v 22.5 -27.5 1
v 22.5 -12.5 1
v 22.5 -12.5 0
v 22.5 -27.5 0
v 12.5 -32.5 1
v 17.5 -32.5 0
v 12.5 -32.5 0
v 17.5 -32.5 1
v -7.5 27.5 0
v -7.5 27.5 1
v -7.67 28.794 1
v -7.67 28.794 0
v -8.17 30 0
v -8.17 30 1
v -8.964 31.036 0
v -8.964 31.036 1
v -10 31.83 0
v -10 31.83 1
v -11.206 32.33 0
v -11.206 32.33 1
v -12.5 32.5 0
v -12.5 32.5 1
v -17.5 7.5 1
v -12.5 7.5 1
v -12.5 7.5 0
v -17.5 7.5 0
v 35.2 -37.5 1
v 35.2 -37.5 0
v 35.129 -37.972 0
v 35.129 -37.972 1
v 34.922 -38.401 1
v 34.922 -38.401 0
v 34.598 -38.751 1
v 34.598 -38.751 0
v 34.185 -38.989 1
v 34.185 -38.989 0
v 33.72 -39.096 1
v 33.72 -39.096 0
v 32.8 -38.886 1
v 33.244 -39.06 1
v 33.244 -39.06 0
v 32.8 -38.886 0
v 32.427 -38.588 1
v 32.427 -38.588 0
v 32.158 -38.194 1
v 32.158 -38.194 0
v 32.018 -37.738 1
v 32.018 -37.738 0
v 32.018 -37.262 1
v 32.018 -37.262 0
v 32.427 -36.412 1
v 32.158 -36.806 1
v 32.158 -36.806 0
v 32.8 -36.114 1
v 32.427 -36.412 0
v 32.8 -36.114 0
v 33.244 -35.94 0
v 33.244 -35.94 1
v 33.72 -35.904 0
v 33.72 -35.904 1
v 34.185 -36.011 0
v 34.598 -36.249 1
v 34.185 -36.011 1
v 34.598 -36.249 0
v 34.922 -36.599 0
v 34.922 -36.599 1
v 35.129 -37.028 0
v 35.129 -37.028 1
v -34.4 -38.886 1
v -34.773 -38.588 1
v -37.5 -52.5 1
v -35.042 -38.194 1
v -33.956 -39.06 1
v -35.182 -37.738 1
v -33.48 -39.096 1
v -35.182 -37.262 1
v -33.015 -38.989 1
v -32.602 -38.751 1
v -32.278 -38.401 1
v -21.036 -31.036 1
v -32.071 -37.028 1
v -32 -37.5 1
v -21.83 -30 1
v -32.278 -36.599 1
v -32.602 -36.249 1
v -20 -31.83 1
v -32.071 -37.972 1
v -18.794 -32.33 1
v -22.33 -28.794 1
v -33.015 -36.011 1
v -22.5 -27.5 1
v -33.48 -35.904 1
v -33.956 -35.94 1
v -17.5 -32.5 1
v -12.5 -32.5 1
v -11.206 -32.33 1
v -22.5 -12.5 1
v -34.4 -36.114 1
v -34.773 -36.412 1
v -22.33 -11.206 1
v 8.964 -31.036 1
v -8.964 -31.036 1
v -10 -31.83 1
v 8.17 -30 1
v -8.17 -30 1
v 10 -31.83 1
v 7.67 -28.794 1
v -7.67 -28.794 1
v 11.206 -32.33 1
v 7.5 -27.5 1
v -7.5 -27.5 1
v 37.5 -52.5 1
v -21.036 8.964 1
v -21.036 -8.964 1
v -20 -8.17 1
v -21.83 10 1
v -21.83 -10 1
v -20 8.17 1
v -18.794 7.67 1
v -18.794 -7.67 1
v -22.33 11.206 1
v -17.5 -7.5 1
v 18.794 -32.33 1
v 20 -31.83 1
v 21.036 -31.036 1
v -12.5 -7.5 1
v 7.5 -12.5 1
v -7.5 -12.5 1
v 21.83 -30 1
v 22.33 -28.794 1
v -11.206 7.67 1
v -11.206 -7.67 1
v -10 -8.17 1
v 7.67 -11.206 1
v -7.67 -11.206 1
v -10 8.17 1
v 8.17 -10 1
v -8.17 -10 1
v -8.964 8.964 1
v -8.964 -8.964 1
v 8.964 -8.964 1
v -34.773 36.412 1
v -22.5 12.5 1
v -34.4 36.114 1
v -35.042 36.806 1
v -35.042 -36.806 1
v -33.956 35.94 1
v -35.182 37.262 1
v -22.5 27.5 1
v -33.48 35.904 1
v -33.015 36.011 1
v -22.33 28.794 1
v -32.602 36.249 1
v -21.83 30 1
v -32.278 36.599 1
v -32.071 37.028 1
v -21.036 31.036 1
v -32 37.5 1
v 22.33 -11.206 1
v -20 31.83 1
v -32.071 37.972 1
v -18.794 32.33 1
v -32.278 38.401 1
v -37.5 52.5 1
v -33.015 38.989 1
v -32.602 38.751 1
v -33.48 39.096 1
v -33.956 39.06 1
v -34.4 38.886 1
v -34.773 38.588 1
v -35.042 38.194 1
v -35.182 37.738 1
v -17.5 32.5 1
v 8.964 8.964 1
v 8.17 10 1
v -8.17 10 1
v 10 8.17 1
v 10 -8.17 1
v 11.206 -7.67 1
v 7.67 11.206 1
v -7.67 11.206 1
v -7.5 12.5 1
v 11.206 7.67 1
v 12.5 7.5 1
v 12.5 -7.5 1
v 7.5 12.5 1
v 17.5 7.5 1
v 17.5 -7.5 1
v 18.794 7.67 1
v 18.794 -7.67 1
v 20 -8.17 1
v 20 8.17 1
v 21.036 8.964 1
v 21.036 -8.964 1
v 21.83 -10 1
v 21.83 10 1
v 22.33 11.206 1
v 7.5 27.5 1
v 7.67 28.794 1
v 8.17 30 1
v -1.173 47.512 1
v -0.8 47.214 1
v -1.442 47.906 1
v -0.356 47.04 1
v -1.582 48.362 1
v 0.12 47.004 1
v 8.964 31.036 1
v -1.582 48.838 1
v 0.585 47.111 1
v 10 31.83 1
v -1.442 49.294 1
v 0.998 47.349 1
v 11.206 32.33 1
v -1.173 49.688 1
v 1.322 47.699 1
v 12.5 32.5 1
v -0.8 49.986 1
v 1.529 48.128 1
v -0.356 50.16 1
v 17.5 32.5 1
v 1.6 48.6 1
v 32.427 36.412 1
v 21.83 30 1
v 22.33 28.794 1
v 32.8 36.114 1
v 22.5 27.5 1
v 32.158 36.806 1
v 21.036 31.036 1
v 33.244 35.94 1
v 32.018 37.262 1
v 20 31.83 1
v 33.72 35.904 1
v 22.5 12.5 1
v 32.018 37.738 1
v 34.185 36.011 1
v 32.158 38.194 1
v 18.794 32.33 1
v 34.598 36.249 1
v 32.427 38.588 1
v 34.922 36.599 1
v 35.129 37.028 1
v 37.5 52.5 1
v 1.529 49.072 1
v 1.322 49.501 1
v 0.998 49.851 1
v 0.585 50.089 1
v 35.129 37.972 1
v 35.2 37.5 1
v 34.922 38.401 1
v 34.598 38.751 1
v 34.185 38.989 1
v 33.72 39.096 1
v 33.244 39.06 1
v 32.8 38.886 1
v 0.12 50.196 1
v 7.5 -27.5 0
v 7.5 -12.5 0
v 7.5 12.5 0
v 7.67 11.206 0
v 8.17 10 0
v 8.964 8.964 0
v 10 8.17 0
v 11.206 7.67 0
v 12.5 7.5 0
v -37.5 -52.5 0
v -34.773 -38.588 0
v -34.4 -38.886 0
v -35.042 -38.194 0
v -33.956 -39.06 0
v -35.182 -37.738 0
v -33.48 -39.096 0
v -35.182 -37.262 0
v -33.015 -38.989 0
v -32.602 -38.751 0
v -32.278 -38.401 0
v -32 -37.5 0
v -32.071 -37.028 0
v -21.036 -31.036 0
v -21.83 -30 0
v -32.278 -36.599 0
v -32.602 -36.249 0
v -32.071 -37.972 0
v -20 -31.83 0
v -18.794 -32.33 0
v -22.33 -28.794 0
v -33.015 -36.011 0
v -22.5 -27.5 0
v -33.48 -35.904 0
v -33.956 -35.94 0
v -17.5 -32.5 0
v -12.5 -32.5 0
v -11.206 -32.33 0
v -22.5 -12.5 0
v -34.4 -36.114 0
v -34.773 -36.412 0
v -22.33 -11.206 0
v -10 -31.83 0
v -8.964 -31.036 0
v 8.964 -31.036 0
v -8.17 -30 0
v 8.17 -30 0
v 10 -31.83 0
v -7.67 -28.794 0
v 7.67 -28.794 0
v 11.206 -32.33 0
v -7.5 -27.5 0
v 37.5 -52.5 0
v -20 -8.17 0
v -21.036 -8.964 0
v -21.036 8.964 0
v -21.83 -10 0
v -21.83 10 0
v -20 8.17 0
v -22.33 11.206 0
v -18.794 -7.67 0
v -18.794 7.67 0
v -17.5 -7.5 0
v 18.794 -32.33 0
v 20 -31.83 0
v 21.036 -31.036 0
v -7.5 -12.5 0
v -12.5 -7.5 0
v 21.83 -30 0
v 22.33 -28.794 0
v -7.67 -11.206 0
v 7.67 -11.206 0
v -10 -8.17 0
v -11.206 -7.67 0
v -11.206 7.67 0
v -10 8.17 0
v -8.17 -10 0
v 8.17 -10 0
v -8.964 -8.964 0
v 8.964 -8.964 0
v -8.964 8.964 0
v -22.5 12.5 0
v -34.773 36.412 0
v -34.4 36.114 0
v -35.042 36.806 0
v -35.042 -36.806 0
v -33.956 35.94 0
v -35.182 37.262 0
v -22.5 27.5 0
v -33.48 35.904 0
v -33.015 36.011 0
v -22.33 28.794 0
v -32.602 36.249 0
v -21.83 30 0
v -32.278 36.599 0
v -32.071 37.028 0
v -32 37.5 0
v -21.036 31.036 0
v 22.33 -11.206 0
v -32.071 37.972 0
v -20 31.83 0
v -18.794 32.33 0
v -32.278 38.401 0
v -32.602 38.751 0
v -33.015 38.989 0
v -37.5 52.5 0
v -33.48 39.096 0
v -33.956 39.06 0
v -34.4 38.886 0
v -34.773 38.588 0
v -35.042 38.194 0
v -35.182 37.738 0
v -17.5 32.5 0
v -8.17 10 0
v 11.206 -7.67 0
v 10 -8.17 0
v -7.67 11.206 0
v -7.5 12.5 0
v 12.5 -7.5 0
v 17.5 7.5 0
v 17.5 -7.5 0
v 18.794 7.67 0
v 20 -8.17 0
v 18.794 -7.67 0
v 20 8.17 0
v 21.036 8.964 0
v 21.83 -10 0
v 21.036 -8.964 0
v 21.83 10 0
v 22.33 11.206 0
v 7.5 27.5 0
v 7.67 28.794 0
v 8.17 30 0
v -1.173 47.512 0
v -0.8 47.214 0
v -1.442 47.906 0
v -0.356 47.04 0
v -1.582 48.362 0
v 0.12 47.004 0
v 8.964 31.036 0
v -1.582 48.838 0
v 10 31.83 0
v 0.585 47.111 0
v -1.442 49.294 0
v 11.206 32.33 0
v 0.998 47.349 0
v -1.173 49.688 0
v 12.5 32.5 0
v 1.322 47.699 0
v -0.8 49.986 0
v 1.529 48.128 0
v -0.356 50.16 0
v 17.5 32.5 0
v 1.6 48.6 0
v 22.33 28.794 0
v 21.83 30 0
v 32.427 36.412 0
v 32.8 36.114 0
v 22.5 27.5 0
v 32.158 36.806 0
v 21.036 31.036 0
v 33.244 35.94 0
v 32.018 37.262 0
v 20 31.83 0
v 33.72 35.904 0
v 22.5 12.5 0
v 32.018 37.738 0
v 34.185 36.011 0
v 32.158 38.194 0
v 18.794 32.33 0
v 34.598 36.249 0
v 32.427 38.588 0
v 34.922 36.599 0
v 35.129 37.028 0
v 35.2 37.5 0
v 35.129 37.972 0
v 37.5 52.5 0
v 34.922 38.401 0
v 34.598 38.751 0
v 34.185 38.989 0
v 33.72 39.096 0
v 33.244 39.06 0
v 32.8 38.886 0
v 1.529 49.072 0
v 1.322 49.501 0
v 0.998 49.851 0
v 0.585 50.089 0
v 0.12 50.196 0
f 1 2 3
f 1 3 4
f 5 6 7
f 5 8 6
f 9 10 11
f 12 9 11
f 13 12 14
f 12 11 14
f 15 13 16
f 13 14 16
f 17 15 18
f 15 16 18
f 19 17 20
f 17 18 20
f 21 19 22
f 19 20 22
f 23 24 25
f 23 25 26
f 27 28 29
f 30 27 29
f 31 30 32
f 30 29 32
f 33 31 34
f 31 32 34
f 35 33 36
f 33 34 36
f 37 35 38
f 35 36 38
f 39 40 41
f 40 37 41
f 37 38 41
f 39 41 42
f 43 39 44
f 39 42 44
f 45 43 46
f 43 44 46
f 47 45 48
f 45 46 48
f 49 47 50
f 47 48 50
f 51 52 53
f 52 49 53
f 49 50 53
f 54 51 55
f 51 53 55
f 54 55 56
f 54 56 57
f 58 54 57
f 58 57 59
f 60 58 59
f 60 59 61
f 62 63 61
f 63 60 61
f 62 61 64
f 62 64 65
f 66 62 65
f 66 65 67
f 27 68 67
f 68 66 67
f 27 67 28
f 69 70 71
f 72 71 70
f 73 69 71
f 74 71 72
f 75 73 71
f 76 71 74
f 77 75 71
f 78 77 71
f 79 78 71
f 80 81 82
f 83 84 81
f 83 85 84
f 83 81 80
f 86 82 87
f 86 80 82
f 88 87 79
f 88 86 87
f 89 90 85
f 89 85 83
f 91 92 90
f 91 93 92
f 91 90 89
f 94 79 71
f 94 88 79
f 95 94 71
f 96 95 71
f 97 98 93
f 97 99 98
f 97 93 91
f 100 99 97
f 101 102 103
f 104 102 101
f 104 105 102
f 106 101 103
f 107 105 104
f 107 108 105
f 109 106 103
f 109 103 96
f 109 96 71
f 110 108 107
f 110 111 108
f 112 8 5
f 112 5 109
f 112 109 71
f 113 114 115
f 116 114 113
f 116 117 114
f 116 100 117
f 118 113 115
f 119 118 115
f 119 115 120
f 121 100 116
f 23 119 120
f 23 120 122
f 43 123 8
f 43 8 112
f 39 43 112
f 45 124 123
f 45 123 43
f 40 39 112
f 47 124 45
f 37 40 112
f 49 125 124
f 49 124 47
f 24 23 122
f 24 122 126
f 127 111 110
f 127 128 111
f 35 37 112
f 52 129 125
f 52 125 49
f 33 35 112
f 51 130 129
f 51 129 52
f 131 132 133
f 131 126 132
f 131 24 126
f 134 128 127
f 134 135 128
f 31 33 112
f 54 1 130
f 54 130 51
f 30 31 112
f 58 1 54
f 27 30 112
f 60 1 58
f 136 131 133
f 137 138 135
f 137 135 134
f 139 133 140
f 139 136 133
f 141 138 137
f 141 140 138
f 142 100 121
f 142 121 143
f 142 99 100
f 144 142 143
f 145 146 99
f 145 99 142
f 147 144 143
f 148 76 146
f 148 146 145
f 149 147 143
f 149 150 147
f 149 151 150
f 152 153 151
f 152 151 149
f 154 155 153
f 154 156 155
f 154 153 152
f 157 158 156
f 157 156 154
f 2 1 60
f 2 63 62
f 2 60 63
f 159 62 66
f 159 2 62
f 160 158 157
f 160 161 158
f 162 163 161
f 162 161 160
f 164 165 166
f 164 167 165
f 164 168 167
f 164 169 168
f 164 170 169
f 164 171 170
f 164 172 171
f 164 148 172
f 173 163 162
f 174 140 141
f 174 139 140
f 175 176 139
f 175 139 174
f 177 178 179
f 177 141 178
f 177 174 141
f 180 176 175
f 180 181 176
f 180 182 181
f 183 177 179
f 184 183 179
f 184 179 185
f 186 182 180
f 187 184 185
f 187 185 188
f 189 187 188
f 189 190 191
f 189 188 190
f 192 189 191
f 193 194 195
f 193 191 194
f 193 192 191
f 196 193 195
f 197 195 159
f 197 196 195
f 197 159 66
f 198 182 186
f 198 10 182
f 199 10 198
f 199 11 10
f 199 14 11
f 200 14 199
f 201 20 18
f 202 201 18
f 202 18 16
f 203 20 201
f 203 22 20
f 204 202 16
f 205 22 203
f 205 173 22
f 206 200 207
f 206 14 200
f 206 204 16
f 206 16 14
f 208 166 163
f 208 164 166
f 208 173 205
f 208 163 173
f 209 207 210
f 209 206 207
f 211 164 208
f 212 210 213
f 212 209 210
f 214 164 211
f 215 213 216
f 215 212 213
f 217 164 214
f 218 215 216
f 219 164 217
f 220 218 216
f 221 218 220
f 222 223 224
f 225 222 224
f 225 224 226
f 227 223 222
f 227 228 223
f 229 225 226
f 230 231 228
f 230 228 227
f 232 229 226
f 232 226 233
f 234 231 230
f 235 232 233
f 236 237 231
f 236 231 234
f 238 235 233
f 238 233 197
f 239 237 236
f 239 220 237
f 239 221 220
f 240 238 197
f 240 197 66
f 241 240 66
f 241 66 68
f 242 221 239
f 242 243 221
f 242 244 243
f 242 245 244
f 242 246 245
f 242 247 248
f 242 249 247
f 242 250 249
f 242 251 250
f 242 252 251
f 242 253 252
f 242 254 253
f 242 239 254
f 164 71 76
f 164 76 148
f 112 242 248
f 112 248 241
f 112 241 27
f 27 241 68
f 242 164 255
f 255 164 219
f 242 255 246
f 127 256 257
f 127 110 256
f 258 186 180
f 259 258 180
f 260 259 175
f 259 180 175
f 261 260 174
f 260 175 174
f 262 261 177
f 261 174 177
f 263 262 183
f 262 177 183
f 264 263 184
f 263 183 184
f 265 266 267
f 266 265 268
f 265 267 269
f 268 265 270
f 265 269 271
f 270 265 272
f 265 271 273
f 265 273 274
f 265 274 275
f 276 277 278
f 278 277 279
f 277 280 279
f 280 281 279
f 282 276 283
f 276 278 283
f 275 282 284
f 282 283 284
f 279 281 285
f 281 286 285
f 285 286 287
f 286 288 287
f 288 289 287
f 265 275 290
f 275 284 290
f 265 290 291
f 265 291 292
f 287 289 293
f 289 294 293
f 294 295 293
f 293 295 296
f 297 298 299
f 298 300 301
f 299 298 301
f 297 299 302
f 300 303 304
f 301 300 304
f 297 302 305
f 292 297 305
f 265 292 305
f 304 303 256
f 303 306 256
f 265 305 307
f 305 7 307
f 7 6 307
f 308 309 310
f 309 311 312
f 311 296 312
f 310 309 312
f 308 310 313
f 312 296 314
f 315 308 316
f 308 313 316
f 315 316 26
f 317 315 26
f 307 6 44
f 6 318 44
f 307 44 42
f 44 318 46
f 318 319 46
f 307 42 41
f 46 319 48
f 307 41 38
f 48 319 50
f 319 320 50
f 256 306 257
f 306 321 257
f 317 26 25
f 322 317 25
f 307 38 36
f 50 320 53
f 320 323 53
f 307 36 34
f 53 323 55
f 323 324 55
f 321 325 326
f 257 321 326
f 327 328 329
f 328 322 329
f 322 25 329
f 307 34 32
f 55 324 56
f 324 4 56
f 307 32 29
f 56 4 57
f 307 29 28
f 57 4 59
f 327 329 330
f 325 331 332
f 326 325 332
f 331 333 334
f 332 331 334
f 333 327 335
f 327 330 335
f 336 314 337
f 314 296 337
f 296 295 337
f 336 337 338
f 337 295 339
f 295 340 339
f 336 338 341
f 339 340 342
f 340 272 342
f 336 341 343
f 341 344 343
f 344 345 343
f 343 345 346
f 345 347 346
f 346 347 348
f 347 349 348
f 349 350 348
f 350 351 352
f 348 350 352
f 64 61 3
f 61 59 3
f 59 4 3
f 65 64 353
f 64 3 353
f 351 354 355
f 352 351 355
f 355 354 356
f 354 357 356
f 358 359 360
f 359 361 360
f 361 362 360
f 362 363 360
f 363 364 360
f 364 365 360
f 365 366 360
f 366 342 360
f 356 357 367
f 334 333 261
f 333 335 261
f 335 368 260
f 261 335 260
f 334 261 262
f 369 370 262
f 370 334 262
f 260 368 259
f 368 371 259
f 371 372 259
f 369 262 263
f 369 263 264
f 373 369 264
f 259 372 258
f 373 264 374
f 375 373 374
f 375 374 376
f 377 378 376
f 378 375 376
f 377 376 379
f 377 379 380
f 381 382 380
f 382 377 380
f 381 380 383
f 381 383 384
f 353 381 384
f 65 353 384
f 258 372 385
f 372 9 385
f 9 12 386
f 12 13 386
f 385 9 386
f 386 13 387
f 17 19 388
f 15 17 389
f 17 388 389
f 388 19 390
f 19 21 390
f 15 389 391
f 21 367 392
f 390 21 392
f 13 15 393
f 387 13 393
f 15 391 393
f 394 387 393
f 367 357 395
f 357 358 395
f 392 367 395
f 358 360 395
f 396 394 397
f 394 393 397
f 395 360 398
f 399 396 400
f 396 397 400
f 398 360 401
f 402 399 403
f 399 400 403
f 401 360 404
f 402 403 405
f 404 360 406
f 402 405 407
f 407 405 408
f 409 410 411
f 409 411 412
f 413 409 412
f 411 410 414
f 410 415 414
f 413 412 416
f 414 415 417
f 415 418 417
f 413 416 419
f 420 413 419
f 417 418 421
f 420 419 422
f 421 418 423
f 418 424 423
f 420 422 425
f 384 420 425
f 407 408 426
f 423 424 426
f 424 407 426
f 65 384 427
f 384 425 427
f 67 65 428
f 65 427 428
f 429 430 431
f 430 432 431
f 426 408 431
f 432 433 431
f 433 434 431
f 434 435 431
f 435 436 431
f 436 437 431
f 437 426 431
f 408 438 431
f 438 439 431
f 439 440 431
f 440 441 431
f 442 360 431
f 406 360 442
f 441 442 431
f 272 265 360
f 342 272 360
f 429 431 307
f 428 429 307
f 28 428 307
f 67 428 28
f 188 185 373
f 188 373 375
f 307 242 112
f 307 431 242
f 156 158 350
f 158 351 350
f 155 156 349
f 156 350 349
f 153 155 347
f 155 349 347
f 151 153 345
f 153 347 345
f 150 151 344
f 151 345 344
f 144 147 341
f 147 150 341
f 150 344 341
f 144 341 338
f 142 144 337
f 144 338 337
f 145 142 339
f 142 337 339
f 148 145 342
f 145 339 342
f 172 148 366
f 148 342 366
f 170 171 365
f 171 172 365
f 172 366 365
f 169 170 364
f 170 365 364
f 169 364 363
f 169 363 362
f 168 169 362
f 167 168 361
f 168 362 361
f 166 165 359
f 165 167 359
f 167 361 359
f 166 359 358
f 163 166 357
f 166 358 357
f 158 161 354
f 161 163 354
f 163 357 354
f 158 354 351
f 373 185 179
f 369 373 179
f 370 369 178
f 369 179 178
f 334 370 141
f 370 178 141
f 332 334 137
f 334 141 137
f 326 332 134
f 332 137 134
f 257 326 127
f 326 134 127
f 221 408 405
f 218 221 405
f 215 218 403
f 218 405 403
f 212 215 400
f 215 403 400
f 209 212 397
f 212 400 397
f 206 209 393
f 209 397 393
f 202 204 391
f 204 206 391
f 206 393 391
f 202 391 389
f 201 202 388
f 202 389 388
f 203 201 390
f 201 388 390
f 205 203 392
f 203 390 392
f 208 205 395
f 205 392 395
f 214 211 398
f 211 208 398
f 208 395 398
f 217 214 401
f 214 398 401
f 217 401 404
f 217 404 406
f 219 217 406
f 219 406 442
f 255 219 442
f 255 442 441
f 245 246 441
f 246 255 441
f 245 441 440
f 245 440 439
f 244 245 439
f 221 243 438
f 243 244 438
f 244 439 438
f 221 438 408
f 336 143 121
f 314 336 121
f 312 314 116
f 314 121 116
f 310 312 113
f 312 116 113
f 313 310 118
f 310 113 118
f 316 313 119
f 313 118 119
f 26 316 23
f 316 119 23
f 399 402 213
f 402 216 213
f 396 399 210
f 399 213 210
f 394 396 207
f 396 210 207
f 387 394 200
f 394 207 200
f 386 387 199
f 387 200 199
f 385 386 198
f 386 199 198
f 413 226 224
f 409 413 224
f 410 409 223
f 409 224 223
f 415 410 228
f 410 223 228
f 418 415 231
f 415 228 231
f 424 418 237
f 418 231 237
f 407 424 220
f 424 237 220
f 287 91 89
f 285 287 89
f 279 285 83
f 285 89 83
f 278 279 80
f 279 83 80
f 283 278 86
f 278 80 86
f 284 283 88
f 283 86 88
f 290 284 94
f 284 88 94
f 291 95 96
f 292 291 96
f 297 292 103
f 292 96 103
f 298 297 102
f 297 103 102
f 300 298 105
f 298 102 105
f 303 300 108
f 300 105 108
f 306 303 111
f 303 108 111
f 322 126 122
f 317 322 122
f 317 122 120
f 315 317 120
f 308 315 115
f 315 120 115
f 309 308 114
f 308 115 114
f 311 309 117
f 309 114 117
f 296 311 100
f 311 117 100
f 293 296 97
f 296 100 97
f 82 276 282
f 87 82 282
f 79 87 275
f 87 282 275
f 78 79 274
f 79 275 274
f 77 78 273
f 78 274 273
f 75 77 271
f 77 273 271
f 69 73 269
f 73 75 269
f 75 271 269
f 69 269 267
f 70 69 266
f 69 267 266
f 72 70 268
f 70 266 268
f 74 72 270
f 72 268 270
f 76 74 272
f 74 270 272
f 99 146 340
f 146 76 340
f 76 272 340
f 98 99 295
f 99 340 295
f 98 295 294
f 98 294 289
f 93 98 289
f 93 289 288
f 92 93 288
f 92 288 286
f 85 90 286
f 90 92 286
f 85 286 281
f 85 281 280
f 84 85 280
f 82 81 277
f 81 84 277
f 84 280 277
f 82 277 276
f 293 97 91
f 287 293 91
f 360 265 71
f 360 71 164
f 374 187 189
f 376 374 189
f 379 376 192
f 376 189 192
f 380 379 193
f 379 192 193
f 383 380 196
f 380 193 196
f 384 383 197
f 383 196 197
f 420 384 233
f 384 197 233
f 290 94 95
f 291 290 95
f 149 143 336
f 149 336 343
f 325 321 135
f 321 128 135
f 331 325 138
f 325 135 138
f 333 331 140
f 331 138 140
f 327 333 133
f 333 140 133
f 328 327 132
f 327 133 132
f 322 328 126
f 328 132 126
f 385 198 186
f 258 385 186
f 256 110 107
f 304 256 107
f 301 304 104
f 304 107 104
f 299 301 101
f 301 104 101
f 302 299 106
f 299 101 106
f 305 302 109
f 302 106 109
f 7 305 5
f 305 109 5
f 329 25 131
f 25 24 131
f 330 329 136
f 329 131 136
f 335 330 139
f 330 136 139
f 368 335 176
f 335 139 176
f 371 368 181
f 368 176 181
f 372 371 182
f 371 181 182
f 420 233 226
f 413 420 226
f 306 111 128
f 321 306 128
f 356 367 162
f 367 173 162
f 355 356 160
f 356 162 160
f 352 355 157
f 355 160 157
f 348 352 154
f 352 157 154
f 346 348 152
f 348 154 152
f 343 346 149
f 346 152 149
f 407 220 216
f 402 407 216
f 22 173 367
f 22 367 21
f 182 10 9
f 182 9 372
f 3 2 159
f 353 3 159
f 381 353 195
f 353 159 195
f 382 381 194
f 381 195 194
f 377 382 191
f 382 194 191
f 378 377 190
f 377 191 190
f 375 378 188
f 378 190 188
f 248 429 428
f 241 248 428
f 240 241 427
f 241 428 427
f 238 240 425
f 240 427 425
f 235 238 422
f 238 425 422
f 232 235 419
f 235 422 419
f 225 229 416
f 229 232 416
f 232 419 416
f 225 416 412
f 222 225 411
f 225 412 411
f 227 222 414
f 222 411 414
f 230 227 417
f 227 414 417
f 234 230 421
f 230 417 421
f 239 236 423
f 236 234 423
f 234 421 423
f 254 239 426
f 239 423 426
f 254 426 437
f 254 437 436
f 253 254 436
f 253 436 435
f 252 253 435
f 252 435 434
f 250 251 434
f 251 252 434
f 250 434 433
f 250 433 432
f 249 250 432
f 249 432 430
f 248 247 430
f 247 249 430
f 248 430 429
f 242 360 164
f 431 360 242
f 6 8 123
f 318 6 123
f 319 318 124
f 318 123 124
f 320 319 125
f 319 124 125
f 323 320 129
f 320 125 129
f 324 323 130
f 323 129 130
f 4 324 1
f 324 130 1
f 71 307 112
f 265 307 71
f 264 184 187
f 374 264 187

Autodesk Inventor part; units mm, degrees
ref_plane "YZ Plane" through (0, 0, 0) normal (1, 0, 0) x (0, 1, 0)
ref_plane "XZ Plane" through (0, 0, 0) normal (0, 1, 0) x (-1, 0, 0)
ref_plane "XY Plane" through (0, 0, 0) normal (0, 0, 1) x (1, 0, 0)
sketch "Sketch1" plane through (0, 0, 0) normal (0, 0, 1) x (1, 0, 0)
  line L0 (-37.5, 52.5) -> (37.5, 52.5)
  line L1 (37.5, 52.5) -> (37.5, -52.5)
  line L2 (37.5, -52.5) -> (-37.5, -52.5)
  line L3 (-37.5, -52.5) -> (-37.5, 52.5)
  line L4 (-37.5, 52.5) -> (37.5, -52.5) construction
  line L5 (37.5, 52.5) -> (-37.5, -52.5) construction
  circle A0 centre (33.6, -37.5) radius 1.6
  line L6 (0, 0) -> (12.8976, 0)
  line L7 (0, 0) -> (0, 11.3109)
  circle A1 centre (-33.6, -37.5) radius 1.6
  circle A2 centre (33.6, 37.5) radius 1.6
  circle A3 centre (-33.6, 37.5) radius 1.6
  circle A4 centre (0, 48.6) radius 1.6
  dimension "d0" = 75
  dimension "d1" = 105
  dimension "d2" = 3.2
  dimension "d3" = 3.9
  dimension "d4" = 15
  dimension "d11" = 3.2
  dimension "d12" = 3.9
extrude "Plate1" add sketch "Sketch1" along normal blind 1
sketch "Sketch2" plane through (0, 0, 1) normal (0, 0, 1) x (1, 0, 0)
  line L0 (-17.5, 32.5) -> (-12.5, 32.5)
  line L1 (-7.5, 27.5) -> (-7.5, 12.5)
  line L2 (-12.5, 7.5) -> (-17.5, 7.5)
  line L3 (-22.5, 12.5) -> (-22.5, 27.5)
  line L4 (-22.5, 32.5) -> (-7.5, 7.5) construction
  line L5 (-7.5, 32.5) -> (-22.5, 7.5) construction
  line L6 (0, 16.0345) -> (0, -16.0345)
  line L7 (-10.8621, 0) -> (10.8621, 0)
  arc A0 (-17.5, 32.5) -> (-22.5, 27.5) centre (-17.5, 27.5) ccw
  arc A1 (-7.5, 27.5) -> (-12.5, 32.5) centre (-12.5, 27.5) ccw
  arc A2 (-12.5, 7.5) -> (-7.5, 12.5) centre (-12.5, 12.5) ccw
  arc A3 (-22.5, 12.5) -> (-17.5, 7.5) centre (-17.5, 12.5) ccw
  line L8 (17.5, 32.5) -> (12.5, 32.5)
  line L9 (7.5, 27.5) -> (7.5, 12.5)
  line L10 (12.5, 7.5) -> (17.5, 7.5)
  line L11 (22.5, 12.5) -> (22.5, 27.5)
  line L12 (22.5, 32.5) -> (7.5, 7.5) construction
  line L13 (7.5, 32.5) -> (22.5, 7.5) construction
  arc A4 (22.5, 27.5) -> (17.5, 32.5) centre (17.5, 27.5) ccw
  arc A5 (12.5, 32.5) -> (7.5, 27.5) centre (12.5, 27.5) ccw
  arc A6 (7.5, 12.5) -> (12.5, 7.5) centre (12.5, 12.5) ccw
  arc A7 (17.5, 7.5) -> (22.5, 12.5) centre (17.5, 12.5) ccw
  line L14 (-17.5, -32.5) -> (-12.5, -32.5)
  line L15 (-7.5, -27.5) -> (-7.5, -12.5)
  line L16 (-12.5, -7.5) -> (-17.5, -7.5)
  line L17 (-22.5, -12.5) -> (-22.5, -27.5)
  line L18 (-22.5, -32.5) -> (-7.5, -7.5) construction
  line L19 (-7.5, -32.5) -> (-22.5, -7.5) construction
  arc A8 (-22.5, -27.5) -> (-17.5, -32.5) centre (-17.5, -27.5) ccw
  arc A9 (-12.5, -32.5) -> (-7.5, -27.5) centre (-12.5, -27.5) ccw
  arc A10 (-7.5, -12.5) -> (-12.5, -7.5) centre (-12.5, -12.5) ccw
  arc A11 (-17.5, -7.5) -> (-22.5, -12.5) centre (-17.5, -12.5) ccw
  arc A12 (12.5, -7.5) -> (7.5, -12.5) centre (12.5, -12.5) ccw
  line L20 (12.5, -7.5) -> (17.5, -7.5)
  arc A13 (22.5, -12.5) -> (17.5, -7.5) centre (17.5, -12.5) ccw
  line L21 (7.5, -27.5) -> (7.5, -12.5)
  line L22 (22.5, -12.5) -> (22.5, -27.5)
  arc A14 (7.5, -27.5) -> (12.5, -32.5) centre (12.5, -27.5) ccw
  line L23 (7.5, -32.5) -> (22.5, -7.5) construction
  line L24 (22.5, -32.5) -> (7.5, -7.5) construction
  line L25 (17.5, -32.5) -> (12.5, -32.5)
  arc A15 (17.5, -32.5) -> (22.5, -27.5) centre (17.5, -27.5) ccw
  point P0 (0, 0)
  point P1 (-15, 20)
  point P2 (0, 0)
  point P3 (15, 20)
  point P4 (-15, -20)
  point P5 (15, -20)
  dimension "d13" = 15
  dimension "d14" = 15
  dimension "d15" = 15
  dimension "d16" = 25
  dimension "d17" = 5
extrude "Cut1" cut sketch "Sketch2" against normal blind 1
equation "\"d18\" = 厚度"
equation "\"d5\" = 厚度"
equation "\"折彎半徑\" = 厚度"
equation "\"折彎離隙寬度\" = 厚度"
equation "\"折彎離隙深度\" = 0.5 * 厚度"
equation "\"轉角離隙大小\" = 4 * 厚度"
equation "\"最小剩餘\" = 2 * 厚度"
equation "\"轉移半徑\" = 折彎半徑"
equation "\"Jacobi半徑大小\" = 折彎半徑"
equation "\"間隙大小\" = 厚度"
equation "\"厚度\" = 1"
properties part number "battery_box_24V_back" material "Aluminum"
